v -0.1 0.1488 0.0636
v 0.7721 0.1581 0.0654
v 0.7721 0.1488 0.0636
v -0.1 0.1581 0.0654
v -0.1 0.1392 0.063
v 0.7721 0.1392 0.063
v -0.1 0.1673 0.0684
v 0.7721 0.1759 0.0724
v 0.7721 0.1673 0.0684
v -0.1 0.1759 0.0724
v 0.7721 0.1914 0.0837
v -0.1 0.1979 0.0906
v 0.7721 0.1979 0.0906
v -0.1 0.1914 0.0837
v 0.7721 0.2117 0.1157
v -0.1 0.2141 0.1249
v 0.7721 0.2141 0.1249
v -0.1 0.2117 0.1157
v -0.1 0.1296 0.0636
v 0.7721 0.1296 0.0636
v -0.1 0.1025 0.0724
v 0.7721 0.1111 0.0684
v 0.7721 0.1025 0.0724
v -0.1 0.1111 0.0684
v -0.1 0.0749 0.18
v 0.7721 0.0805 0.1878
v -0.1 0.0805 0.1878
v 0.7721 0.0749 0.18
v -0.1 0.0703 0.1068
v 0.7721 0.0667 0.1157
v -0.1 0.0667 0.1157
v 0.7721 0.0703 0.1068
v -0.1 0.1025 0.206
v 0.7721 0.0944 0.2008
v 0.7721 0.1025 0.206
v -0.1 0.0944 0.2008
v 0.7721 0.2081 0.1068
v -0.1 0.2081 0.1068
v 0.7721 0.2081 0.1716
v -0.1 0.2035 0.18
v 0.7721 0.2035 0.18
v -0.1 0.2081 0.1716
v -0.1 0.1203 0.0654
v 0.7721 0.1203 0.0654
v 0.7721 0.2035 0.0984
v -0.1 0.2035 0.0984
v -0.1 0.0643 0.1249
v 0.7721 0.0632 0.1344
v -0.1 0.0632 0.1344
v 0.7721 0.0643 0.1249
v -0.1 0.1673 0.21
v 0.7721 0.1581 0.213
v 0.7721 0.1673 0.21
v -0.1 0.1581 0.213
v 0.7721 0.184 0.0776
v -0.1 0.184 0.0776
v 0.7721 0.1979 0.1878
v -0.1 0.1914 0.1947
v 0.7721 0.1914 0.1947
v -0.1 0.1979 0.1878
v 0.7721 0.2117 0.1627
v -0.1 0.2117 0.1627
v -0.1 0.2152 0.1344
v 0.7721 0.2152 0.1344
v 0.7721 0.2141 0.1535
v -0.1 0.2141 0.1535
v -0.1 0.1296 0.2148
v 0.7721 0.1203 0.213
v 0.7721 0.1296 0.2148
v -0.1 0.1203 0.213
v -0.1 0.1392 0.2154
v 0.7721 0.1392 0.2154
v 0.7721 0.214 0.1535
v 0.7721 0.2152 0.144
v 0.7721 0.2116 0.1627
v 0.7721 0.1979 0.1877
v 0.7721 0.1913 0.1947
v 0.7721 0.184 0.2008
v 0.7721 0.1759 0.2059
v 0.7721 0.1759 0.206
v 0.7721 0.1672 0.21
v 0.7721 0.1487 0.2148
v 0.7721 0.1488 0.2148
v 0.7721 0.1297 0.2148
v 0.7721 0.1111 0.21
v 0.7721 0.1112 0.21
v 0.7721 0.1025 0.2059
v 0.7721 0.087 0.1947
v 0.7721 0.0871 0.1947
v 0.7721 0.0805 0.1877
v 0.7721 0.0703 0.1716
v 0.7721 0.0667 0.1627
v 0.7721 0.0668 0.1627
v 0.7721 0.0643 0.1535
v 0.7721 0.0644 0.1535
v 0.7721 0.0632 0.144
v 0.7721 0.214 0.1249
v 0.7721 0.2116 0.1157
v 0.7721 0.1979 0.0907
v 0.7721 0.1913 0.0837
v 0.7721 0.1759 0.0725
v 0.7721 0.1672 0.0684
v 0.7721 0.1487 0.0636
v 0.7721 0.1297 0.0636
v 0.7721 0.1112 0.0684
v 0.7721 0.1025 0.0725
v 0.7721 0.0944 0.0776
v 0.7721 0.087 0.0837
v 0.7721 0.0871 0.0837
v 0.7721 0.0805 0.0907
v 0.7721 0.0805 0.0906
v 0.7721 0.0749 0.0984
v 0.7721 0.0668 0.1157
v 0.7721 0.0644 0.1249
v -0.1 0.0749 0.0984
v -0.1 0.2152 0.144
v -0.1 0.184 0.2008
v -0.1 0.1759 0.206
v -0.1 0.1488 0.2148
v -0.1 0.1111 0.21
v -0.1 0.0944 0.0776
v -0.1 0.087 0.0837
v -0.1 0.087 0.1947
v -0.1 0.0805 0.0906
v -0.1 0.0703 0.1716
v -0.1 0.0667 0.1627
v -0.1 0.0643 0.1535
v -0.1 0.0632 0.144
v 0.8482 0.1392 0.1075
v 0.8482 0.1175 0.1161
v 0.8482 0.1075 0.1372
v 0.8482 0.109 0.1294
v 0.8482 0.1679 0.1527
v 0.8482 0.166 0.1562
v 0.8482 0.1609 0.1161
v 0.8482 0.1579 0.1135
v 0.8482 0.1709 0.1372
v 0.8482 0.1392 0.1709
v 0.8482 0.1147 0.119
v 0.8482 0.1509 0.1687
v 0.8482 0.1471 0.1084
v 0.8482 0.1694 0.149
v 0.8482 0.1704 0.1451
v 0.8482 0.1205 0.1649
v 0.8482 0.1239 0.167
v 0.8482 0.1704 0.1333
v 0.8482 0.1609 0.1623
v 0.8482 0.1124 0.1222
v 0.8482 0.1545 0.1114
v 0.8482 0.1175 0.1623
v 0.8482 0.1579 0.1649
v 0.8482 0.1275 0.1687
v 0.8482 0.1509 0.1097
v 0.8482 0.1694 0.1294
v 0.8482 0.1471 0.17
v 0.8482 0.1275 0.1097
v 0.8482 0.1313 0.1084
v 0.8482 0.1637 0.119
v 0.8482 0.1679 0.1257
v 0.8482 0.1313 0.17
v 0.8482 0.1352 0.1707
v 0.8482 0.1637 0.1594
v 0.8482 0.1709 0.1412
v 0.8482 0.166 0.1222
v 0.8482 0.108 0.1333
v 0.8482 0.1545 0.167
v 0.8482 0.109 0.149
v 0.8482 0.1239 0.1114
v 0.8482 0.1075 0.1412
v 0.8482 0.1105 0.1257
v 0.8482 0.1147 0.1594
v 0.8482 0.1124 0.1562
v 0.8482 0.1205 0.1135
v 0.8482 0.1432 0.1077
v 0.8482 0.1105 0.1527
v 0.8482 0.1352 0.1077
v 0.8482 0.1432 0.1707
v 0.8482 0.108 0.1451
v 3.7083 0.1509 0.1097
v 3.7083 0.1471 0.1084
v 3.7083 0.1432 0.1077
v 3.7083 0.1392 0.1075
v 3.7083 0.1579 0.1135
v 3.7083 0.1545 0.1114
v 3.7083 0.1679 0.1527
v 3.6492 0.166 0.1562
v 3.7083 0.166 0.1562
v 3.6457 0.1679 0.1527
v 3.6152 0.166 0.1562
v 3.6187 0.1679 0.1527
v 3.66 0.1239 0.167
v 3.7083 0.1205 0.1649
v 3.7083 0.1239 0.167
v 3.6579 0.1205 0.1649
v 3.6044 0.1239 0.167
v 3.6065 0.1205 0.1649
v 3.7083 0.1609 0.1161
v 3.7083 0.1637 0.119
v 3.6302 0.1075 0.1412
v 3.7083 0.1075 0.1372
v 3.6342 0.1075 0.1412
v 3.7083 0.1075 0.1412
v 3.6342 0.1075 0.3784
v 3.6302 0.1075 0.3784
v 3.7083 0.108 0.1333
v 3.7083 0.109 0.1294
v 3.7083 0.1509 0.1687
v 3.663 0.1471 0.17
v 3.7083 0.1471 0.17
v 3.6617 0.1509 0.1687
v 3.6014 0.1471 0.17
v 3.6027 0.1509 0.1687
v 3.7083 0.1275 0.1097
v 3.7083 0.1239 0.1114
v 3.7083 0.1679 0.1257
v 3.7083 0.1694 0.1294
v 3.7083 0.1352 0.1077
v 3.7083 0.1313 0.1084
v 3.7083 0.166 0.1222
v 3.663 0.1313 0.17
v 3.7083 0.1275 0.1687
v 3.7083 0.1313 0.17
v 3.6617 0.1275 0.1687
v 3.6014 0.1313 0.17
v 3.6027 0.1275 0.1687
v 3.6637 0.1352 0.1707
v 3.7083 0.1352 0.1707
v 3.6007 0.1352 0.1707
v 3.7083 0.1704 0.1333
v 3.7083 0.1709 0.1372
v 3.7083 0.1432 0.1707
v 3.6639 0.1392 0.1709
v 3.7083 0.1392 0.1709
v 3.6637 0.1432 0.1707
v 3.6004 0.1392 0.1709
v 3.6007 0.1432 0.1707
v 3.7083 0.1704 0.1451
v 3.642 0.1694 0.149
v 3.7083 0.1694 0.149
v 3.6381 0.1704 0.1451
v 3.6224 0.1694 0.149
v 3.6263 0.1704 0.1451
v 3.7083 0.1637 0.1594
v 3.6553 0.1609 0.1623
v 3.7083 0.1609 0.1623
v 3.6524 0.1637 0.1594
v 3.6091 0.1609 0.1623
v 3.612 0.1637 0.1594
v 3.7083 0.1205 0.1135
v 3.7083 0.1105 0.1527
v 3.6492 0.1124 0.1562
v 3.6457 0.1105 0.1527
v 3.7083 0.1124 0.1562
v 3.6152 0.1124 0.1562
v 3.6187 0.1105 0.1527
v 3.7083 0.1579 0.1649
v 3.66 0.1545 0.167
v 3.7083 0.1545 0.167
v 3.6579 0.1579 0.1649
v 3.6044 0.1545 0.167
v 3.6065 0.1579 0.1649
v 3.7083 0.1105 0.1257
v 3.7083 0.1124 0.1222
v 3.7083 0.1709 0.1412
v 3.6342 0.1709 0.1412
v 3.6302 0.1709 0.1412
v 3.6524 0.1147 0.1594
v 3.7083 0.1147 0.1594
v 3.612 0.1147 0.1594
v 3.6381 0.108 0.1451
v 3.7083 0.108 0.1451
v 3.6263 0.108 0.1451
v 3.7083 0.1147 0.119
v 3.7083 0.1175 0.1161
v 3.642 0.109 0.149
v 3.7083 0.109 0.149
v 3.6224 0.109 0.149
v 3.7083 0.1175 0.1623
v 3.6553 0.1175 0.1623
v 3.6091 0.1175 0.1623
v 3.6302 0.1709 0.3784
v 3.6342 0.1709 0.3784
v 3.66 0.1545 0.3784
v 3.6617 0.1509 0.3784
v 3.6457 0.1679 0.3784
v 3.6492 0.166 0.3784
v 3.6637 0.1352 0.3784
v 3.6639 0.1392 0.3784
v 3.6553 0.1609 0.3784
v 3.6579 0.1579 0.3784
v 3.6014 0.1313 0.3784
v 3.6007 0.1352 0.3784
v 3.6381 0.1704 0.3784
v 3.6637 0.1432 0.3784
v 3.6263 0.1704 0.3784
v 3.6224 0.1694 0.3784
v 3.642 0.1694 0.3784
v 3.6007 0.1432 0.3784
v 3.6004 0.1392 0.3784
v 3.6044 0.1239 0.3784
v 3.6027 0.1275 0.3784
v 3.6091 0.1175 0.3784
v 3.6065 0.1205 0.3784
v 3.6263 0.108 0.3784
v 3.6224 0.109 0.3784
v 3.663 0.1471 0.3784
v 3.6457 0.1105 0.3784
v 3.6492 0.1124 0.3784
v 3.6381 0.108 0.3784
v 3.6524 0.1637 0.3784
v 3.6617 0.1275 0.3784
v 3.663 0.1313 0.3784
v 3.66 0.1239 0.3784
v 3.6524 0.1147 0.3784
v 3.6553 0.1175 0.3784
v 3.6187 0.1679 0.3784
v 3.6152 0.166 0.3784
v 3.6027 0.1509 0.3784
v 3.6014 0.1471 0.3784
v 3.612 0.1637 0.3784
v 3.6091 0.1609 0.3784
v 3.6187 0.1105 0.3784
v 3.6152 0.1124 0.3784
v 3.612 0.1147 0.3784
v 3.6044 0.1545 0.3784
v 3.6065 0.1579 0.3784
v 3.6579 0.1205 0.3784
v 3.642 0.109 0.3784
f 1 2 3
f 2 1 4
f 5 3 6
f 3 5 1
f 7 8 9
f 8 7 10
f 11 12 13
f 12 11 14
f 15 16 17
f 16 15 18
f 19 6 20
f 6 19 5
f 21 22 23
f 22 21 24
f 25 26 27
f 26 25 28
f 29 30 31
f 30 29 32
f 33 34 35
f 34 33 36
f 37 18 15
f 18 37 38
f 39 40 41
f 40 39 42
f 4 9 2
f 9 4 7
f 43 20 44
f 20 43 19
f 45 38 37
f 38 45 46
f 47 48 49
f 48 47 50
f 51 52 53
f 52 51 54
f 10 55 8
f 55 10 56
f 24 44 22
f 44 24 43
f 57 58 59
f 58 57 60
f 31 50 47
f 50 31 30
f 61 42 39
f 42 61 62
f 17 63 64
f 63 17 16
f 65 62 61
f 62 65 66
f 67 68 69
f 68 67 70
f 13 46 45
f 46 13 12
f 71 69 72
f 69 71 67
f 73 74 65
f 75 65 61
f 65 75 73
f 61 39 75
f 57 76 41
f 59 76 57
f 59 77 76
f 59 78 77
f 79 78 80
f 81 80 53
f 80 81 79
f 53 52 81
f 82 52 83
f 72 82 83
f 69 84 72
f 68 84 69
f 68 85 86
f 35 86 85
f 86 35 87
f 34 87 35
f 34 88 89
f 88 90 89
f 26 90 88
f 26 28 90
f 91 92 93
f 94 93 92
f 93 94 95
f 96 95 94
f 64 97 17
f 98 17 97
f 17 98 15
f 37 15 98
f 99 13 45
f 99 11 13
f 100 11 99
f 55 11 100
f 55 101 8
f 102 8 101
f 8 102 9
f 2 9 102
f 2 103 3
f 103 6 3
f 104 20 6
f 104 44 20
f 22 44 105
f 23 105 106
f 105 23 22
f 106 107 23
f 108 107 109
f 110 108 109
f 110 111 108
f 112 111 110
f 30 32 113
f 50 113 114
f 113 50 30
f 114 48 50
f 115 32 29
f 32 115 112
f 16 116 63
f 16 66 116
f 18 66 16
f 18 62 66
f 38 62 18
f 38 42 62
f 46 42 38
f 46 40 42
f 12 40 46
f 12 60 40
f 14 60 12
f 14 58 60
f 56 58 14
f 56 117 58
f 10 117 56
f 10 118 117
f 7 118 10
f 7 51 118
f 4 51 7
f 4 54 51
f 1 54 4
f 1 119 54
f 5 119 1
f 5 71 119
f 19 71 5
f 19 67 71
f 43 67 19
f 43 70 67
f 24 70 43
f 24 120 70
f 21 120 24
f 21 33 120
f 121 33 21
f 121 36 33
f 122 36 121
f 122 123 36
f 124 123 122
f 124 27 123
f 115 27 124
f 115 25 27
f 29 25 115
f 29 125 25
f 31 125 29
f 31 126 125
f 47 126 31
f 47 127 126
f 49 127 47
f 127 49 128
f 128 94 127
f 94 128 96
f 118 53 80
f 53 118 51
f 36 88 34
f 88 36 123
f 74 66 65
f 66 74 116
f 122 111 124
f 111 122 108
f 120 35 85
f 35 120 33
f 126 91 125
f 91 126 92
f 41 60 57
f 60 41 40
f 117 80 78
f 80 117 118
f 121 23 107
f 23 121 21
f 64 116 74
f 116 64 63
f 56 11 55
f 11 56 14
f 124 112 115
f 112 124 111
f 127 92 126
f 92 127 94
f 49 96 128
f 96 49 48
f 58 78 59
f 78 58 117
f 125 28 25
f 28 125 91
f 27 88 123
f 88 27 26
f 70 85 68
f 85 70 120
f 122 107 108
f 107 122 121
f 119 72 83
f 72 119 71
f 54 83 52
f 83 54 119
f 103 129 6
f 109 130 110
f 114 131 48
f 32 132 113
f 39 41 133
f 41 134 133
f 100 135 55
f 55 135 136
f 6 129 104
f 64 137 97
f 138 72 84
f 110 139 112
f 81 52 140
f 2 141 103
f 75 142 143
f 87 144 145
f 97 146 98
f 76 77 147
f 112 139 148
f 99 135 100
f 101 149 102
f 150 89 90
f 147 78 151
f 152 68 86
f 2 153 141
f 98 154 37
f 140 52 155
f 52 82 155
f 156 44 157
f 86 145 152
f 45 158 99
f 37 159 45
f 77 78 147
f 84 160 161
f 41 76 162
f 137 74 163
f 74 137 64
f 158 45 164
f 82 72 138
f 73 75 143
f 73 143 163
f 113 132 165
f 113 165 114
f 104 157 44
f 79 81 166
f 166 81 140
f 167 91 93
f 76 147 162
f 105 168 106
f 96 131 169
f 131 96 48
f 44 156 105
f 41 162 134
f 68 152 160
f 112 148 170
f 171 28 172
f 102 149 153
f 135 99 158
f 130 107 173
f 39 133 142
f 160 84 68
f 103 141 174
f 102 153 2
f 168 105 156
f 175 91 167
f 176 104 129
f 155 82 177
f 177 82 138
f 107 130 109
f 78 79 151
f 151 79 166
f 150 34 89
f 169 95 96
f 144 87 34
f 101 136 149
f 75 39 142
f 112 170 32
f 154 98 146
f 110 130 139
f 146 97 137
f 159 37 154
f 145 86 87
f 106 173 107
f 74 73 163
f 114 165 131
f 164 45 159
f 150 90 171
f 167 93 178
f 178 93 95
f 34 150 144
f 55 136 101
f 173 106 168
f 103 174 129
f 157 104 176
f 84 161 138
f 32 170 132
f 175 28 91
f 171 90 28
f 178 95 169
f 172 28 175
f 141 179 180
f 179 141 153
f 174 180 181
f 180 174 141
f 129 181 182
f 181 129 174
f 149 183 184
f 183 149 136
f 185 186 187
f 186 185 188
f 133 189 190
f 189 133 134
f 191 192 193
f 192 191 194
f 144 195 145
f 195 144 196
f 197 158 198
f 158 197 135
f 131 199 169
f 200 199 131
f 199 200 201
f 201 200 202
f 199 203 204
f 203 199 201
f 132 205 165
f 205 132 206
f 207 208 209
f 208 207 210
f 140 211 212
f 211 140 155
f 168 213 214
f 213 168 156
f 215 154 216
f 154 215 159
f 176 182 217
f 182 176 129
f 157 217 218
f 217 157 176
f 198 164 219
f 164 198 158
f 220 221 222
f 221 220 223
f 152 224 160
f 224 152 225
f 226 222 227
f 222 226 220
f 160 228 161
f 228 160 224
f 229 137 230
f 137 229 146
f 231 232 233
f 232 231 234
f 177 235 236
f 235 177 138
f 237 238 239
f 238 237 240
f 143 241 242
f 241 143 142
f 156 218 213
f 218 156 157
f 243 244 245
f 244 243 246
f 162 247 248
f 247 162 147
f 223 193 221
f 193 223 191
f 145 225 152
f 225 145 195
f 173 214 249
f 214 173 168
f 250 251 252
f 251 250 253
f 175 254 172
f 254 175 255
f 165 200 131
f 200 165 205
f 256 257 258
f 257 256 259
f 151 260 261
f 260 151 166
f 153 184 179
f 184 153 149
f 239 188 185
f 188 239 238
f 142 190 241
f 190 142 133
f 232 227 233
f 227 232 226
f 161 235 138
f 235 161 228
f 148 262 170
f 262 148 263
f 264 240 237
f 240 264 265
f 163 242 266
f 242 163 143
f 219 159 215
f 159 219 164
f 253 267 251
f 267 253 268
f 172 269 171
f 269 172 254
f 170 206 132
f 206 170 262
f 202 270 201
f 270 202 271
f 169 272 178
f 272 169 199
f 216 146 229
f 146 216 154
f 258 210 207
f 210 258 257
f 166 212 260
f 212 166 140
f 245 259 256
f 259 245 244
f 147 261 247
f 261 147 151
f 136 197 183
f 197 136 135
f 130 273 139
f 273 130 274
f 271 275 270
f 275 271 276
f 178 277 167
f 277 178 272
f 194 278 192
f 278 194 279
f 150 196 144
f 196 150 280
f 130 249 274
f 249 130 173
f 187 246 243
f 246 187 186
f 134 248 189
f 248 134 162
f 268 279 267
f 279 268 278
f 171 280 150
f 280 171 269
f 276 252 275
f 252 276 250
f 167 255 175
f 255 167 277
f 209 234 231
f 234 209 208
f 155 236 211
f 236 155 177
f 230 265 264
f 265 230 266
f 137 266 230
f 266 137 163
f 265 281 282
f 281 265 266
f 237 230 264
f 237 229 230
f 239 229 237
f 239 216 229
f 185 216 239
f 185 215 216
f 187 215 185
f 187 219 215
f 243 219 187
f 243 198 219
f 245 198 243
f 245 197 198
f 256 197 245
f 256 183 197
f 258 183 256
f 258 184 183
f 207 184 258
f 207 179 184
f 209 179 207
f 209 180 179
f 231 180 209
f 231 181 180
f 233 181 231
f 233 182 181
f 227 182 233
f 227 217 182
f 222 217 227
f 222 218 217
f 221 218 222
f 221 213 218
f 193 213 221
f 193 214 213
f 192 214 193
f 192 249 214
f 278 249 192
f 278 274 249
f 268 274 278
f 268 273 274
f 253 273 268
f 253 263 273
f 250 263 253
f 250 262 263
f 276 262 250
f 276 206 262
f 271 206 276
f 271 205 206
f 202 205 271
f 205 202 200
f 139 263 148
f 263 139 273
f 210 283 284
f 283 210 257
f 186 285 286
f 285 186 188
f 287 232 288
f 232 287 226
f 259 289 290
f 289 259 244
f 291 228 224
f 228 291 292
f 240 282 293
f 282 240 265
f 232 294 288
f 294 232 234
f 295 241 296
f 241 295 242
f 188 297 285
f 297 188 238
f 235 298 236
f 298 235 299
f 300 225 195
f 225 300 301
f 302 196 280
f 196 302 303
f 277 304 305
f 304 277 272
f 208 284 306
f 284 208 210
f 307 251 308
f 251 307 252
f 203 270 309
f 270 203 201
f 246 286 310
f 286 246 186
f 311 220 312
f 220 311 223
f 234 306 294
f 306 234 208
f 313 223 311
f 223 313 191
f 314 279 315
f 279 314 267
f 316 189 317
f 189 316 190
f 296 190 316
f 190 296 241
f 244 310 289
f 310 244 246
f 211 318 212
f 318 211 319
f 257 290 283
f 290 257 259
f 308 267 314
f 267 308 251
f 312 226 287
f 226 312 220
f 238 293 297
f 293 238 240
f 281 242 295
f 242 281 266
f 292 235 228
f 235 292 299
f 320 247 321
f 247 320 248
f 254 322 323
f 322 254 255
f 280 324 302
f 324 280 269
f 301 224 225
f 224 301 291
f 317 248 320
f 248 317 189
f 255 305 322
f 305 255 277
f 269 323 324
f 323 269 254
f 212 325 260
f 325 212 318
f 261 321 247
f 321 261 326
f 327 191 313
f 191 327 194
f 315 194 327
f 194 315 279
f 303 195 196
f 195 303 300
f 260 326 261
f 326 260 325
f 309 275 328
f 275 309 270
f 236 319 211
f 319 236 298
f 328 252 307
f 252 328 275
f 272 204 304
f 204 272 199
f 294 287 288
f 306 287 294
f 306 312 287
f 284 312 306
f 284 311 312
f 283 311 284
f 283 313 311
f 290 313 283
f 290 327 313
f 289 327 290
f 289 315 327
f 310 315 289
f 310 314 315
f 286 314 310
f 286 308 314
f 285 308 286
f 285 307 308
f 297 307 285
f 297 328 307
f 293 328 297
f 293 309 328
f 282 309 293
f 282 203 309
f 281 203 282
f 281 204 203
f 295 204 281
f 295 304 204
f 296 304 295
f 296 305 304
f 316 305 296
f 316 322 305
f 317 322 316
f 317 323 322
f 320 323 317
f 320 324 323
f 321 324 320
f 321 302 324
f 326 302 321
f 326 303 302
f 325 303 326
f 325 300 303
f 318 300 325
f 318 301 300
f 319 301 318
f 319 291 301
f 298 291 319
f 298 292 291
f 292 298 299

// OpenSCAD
//!OpenSCAD

// constant dims (in m)
domain_overlap = 0.1;
air_reactor_diameter = 0.1524;
air_reactor_height = 0.7720;
air_reactor_c2c_height = 0.0762;
riser_diameter = 0.0635;
riser_height = 2.8602;
outlet_height = 3.6322;
outlet_length = 0.1392;
offset = 0.1392;
pipe_overlap = 1e-4*air_reactor_height;

translate([0, offset, offset]){ 
    rotate([0, 90, 0]){
        union(){
            // air reactor
            translate([0, 0, -domain_overlap]){
               cylinder($fn=50, 
                        r1=0.5*air_reactor_diameter, 
                        r2=0.5*air_reactor_diameter, 
                        h=air_reactor_height+domain_overlap+pipe_overlap, 
                        center=false); 
             }
            // air-reactor to riser neck 
            translate([0, 0, air_reactor_height]){
               cylinder($fn=50, 
                        r1=0.5*air_reactor_diameter, 
                        r2=0.5*riser_diameter, 
                        h=air_reactor_c2c_height, 
                        center=false); 
            }        
            // riser
            translate([0, 0, air_reactor_height+air_reactor_c2c_height-pipe_overlap]){
               cylinder($fn=50, 
                        r1=0.5*riser_diameter, 
                        r2=0.5*riser_diameter, 
                        h=riser_height,
                        center=false); 
            }
            //outlet
            translate([0, 0, outlet_height]){
                rotate([0,-90,0]){
                   cylinder($fn=50, 
                            r1=0.5*riser_diameter, 
                            r2=0.5*riser_diameter, 
                            h=outlet_length+domain_overlap,
                            center=false);
                } 
            }        
        }//union
    }
}
